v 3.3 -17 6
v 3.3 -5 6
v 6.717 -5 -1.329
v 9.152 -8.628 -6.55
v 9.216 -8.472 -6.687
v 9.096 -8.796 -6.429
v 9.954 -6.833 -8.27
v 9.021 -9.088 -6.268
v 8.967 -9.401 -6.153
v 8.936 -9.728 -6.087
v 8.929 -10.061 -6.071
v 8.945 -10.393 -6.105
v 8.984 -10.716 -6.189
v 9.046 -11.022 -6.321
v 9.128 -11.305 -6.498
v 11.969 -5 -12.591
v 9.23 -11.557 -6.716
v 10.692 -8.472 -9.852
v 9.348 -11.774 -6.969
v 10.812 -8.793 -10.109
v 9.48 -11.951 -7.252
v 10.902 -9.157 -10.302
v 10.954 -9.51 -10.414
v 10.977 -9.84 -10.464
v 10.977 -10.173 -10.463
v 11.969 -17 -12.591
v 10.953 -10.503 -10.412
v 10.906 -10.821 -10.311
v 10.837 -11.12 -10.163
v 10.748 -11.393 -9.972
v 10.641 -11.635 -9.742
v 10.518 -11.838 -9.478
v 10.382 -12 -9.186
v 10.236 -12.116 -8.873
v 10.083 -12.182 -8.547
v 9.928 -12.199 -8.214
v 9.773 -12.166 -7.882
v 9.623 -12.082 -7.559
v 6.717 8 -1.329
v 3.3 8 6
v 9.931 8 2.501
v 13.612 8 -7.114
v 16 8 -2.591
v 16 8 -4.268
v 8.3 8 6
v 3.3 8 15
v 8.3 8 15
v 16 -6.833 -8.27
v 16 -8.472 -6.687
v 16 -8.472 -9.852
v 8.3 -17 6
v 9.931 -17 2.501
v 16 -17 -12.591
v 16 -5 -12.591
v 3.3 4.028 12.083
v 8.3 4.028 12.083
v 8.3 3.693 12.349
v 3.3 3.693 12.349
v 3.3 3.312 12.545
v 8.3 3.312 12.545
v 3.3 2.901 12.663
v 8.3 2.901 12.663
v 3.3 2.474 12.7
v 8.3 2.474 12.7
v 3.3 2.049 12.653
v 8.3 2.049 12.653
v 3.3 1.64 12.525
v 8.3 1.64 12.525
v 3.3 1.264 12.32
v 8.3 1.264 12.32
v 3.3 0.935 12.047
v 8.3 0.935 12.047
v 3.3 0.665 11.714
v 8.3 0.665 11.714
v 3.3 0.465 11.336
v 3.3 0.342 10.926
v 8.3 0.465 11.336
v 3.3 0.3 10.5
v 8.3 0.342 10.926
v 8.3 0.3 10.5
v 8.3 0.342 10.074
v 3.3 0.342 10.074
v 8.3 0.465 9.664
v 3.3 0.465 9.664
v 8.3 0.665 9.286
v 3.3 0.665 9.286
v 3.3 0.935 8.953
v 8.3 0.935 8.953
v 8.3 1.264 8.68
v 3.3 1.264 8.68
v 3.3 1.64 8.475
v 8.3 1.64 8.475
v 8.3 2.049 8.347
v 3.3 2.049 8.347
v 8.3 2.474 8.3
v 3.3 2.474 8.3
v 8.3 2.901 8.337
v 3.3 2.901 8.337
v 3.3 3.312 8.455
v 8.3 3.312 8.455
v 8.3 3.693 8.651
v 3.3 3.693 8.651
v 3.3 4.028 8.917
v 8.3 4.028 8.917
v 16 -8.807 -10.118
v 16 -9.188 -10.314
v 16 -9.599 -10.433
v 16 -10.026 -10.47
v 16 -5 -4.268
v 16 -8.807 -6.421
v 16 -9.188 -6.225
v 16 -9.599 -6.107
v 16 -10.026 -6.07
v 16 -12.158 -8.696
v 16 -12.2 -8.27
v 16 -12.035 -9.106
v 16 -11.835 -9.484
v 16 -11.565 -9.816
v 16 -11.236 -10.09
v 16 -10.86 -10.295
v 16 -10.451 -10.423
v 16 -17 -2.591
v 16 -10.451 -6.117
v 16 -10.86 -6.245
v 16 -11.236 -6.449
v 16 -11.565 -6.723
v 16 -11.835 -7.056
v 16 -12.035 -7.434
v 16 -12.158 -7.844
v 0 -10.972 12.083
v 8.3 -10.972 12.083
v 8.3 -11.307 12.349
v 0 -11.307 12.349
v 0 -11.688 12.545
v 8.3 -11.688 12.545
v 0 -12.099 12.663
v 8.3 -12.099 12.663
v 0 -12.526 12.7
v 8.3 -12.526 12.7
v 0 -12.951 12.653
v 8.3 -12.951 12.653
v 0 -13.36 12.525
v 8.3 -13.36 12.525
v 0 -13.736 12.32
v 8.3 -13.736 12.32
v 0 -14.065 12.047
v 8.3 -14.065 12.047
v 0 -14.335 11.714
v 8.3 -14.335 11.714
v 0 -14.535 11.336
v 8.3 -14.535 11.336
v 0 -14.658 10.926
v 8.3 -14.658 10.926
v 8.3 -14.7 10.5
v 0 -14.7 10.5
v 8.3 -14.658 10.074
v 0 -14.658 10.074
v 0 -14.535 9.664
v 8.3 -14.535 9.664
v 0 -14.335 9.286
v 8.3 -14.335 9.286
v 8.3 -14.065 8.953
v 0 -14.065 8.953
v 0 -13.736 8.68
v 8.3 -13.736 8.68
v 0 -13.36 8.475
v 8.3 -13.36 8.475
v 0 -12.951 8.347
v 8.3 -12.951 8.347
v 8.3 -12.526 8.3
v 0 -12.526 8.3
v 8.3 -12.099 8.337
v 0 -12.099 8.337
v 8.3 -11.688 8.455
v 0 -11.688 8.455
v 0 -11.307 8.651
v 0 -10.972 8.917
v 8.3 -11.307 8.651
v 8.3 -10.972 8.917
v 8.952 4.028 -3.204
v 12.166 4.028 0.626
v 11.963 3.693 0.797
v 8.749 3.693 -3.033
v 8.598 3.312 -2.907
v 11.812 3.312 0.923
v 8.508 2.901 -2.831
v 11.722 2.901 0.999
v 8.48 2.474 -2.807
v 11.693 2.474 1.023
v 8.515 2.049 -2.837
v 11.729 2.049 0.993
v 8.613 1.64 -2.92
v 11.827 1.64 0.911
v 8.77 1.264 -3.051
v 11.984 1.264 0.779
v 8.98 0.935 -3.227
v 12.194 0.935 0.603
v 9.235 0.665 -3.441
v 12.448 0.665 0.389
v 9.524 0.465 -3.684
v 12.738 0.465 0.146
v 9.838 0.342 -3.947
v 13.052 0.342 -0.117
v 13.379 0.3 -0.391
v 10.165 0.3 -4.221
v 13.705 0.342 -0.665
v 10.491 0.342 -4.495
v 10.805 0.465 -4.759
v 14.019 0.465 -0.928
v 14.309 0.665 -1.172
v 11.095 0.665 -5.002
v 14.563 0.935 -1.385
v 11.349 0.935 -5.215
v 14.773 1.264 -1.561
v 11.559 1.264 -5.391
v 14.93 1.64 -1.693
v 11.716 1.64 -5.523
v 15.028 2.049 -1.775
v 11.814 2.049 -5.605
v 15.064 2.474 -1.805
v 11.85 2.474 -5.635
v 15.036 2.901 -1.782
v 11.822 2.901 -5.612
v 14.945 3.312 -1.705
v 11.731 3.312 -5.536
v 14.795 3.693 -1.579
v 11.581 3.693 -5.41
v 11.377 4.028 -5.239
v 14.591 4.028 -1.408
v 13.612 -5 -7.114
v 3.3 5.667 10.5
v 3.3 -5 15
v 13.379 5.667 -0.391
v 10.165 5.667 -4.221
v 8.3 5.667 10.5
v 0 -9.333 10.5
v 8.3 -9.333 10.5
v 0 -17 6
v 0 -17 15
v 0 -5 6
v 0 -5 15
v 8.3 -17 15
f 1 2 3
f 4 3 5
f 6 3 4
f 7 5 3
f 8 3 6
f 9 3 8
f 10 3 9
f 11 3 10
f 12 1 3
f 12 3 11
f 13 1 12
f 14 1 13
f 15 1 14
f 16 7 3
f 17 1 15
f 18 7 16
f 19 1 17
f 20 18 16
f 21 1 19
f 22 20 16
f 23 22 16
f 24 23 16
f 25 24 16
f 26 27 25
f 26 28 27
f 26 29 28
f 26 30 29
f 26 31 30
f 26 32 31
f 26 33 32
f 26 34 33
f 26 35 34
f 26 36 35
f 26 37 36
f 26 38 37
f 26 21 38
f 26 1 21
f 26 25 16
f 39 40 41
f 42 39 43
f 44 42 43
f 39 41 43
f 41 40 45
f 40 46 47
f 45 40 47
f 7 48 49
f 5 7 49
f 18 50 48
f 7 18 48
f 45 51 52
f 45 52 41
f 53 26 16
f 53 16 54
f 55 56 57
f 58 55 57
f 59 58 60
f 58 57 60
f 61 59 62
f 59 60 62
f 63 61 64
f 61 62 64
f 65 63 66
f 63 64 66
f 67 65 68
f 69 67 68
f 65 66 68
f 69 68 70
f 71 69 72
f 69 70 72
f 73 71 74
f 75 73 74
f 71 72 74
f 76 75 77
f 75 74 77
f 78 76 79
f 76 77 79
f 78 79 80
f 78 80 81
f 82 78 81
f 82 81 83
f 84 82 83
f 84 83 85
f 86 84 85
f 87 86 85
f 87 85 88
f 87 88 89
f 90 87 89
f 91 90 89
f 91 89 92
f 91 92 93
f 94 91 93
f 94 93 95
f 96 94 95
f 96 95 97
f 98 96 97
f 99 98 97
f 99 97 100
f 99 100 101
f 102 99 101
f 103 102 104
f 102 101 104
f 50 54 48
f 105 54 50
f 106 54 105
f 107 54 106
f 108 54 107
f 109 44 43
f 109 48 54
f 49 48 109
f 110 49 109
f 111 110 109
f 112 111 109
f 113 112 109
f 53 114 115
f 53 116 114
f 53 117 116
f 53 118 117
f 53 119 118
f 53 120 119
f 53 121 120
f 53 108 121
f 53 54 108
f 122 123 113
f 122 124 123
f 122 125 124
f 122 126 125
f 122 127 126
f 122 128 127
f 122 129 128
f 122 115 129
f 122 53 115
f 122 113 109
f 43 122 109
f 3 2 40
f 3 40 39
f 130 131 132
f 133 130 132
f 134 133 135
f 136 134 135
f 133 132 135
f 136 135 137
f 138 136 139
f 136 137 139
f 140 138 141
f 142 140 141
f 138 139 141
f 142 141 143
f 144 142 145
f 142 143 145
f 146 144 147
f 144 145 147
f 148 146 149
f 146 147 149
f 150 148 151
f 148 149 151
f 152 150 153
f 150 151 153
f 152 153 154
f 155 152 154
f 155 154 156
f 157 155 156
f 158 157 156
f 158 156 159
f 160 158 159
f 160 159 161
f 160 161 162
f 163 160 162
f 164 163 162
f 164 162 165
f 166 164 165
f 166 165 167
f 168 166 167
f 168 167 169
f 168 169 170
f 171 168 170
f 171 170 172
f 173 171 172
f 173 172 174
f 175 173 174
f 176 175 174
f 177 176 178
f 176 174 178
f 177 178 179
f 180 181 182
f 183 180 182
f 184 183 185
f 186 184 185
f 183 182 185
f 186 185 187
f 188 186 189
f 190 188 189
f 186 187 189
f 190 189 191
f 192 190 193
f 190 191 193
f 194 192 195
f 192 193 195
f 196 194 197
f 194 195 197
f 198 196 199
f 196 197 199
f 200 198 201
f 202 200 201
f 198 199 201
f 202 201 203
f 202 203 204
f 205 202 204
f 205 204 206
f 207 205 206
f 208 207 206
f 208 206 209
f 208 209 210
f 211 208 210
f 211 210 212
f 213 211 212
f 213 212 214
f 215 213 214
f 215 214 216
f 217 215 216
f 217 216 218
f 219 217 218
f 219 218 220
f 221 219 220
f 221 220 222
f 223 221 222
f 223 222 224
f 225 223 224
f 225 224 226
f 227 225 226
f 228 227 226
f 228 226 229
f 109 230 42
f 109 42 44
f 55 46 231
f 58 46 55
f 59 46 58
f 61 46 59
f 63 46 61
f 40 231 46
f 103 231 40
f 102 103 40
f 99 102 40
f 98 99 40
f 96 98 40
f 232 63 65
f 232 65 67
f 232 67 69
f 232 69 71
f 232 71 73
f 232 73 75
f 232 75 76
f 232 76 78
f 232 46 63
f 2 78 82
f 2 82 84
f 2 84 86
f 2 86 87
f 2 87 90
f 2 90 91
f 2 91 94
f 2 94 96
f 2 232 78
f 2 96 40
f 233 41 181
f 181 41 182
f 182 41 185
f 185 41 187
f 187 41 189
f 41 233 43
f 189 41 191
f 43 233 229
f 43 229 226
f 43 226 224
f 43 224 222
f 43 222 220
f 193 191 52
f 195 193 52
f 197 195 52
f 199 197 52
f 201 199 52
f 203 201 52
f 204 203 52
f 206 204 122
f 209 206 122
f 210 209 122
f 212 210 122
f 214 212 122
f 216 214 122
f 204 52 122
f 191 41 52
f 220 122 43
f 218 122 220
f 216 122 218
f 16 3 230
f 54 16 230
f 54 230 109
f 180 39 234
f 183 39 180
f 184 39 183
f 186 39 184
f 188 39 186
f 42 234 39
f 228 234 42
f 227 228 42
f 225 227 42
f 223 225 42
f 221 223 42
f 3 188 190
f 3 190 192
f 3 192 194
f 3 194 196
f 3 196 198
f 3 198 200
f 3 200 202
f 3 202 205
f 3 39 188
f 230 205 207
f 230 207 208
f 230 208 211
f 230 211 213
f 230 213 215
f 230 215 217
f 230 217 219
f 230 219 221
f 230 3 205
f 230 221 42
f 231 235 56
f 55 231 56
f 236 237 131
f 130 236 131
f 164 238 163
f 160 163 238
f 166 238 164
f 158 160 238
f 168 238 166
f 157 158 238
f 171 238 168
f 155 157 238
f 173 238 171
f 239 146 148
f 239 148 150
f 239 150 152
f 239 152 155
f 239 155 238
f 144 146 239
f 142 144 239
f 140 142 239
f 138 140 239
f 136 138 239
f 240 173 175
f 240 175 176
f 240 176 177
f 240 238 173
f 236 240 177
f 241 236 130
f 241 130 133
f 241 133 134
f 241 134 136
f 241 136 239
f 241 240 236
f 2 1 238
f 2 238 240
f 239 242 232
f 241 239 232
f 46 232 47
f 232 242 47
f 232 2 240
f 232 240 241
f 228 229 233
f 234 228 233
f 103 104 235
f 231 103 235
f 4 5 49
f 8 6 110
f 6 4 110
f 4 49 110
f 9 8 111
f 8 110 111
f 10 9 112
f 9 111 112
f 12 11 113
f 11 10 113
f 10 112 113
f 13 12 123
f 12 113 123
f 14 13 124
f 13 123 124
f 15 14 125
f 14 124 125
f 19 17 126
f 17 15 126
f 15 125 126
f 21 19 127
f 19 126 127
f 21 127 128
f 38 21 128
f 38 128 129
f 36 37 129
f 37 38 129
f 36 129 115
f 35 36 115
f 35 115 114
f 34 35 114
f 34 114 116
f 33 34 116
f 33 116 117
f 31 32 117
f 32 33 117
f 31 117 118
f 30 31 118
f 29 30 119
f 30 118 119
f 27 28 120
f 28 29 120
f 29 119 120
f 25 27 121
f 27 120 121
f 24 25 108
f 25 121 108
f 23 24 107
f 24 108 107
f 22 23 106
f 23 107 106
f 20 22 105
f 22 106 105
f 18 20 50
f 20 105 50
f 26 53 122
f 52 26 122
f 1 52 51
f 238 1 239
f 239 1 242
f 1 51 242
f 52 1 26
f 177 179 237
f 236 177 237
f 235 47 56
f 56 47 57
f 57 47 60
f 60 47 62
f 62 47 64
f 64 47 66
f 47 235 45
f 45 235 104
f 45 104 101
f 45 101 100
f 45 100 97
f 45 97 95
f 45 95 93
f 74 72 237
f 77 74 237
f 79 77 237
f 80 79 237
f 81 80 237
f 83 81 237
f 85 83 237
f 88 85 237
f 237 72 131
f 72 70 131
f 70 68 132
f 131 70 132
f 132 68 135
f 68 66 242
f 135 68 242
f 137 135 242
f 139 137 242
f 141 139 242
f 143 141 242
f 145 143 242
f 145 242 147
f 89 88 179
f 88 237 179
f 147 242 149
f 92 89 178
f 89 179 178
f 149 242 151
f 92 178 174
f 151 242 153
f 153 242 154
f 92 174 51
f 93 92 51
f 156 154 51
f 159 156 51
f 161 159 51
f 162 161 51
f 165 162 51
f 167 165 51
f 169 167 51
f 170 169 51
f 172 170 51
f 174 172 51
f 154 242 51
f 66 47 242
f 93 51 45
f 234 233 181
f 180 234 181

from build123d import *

# Parameters (mm, degrees)
BOSS_EXTRUDE1_DEPTH = 12
BOSS_EXTRUDE2_DEPTH = 13
SKETCH3_W           = 9
SKETCH3_H           = 12
BOSS_EXTRUDE3_DEPTH = 3.3
CUT_EXTRUDE1_DEPTH  = 34.256578297
CUT_EXTRUDE2_DEPTH  = 25.143114961
CUT_EXTRUDE3_DEPTH  = 25.143114961
CUT_EXTRUDE4_DEPTH  = 28.6007146
CUT_EXTRUDE5_DEPTH  = 28.748873851
CHAMFER1_SIZE       = 2.129646437


with BuildPart() as part:
    # Sketch1 → Boss-Extrude1 (new body)
    with BuildSketch(Plane.XZ.offset(17)):
        Polygon((16, 15), (3.3, 15), (3.3, 6), (11.968992121, -12.590713597), (16, -12.590713597), align=None)
    extrude(amount=-BOSS_EXTRUDE1_DEPTH)

    # Sketch2 → Boss-Extrude2 (add)
    with BuildSketch(Plane(origin=(0, -5, 0), x_dir=(-1, 0, 0), z_dir=(0, 1, 0))):
        Polygon((-16, 15), (-3.3, 15), (-3.3, 6), (-6.717465771, -1.328778996), (-13.611865759, -7.113867483), (-16, -4.267799921), align=None)
    extrude(amount=BOSS_EXTRUDE2_DEPTH)

    # Sketch3 → Boss-Extrude3 (add)
    with BuildSketch(Plane.ZY.offset(-3.3)):
        with Locations((10.5, -11)):
            Rectangle(SKETCH3_W, SKETCH3_H)
    extrude(amount=BOSS_EXTRUDE3_DEPTH)

    # Sketch4 → Cut-Extrude1 (cut, through all)
    with BuildSketch(Plane.XZ.offset(17)):
        Polygon((16, 15), (8.3, 15), (8.3, 3.870353563), (16, -2.590713597), align=None)
    extrude(amount=-CUT_EXTRUDE1_DEPTH, mode=Mode.SUBTRACT)

    # Sketch5 → Cut-Extrude2 (cut, through all)
    with BuildSketch(Plane(origin=(8.3, 0, 0), x_dir=(0, 0, -1), z_dir=(1, 0, 0))):
        with BuildLine():
            Line((-8.917452439, -10.971751585), (-10.5, -9.332975613))
            Line((-10.5, -9.332975613), (-12.082547561, -10.971751585))
            ThreePointArc((-12.082547561, -10.971751585), (-10.5, -14.7), (-8.917452439, -10.971751585))
        make_face()
    extrude(amount=-CUT_EXTRUDE2_DEPTH, mode=Mode.SUBTRACT)

    # Sketch6 → Cut-Extrude3 (cut, through all)
    with BuildSketch(Plane(origin=(8.3, 0, 0), x_dir=(0, 0, -1), z_dir=(1, 0, 0))):
        with BuildLine():
            Line((-8.917452439, 4.028248415), (-10.5, 5.667024387))
            Line((-10.5, 5.667024387), (-12.082547561, 4.028248415))
            ThreePointArc((-12.082547561, 4.028248415), (-10.5, 0.3), (-8.917452439, 4.028248415))
        make_face()
    extrude(amount=-CUT_EXTRUDE3_DEPTH, mode=Mode.SUBTRACT)

    # Sketch7 → Cut-Extrude4 (cut, through all)
    with BuildSketch(Plane(origin=(5.33513716, 0, 6.358168878), x_dir=(0.766044443118978, 0, -0.6427876096865394), z_dir=(0.6427876096865394, 0, 0.766044443118978))):
        with BuildLine():
            Line((12.082582782, 4.028248415), (10.500035221, 5.667024387))
            Line((10.500035221, 5.667024387), (8.91748766, 4.028248415))
            ThreePointArc((8.91748766, 4.028248415), (10.500035221, 0.3), (12.082582782, 4.028248415))
        make_face()
    extrude(amount=-CUT_EXTRUDE4_DEPTH, mode=Mode.SUBTRACT)

    # Sketch8 → Cut-Extrude5 (cut, through all)
    with BuildSketch(Plane(origin=(16, 0, 0), x_dir=(0, 0, -1), z_dir=(1, 0, 0))):
        with BuildLine():
            Line((9.852318341, -8.471751585), (8.26977078, -6.832975613))
            Line((8.26977078, -6.832975613), (6.68722322, -8.471751585))
            ThreePointArc((6.68722322, -8.471751585), (8.26977078, -12.2), (9.852318341, -8.471751585))
        make_face()
    extrude(amount=-CUT_EXTRUDE5_DEPTH, mode=Mode.SUBTRACT)

    # Chamfer1
    chamfer1_edges = [part.edges().sort_by_distance(p)[0] for p in [
        (8.3, -4.5, 3.870353563),
    ]]
    chamfer(chamfer1_edges, length=CHAMFER1_SIZE)


solid = part.part
